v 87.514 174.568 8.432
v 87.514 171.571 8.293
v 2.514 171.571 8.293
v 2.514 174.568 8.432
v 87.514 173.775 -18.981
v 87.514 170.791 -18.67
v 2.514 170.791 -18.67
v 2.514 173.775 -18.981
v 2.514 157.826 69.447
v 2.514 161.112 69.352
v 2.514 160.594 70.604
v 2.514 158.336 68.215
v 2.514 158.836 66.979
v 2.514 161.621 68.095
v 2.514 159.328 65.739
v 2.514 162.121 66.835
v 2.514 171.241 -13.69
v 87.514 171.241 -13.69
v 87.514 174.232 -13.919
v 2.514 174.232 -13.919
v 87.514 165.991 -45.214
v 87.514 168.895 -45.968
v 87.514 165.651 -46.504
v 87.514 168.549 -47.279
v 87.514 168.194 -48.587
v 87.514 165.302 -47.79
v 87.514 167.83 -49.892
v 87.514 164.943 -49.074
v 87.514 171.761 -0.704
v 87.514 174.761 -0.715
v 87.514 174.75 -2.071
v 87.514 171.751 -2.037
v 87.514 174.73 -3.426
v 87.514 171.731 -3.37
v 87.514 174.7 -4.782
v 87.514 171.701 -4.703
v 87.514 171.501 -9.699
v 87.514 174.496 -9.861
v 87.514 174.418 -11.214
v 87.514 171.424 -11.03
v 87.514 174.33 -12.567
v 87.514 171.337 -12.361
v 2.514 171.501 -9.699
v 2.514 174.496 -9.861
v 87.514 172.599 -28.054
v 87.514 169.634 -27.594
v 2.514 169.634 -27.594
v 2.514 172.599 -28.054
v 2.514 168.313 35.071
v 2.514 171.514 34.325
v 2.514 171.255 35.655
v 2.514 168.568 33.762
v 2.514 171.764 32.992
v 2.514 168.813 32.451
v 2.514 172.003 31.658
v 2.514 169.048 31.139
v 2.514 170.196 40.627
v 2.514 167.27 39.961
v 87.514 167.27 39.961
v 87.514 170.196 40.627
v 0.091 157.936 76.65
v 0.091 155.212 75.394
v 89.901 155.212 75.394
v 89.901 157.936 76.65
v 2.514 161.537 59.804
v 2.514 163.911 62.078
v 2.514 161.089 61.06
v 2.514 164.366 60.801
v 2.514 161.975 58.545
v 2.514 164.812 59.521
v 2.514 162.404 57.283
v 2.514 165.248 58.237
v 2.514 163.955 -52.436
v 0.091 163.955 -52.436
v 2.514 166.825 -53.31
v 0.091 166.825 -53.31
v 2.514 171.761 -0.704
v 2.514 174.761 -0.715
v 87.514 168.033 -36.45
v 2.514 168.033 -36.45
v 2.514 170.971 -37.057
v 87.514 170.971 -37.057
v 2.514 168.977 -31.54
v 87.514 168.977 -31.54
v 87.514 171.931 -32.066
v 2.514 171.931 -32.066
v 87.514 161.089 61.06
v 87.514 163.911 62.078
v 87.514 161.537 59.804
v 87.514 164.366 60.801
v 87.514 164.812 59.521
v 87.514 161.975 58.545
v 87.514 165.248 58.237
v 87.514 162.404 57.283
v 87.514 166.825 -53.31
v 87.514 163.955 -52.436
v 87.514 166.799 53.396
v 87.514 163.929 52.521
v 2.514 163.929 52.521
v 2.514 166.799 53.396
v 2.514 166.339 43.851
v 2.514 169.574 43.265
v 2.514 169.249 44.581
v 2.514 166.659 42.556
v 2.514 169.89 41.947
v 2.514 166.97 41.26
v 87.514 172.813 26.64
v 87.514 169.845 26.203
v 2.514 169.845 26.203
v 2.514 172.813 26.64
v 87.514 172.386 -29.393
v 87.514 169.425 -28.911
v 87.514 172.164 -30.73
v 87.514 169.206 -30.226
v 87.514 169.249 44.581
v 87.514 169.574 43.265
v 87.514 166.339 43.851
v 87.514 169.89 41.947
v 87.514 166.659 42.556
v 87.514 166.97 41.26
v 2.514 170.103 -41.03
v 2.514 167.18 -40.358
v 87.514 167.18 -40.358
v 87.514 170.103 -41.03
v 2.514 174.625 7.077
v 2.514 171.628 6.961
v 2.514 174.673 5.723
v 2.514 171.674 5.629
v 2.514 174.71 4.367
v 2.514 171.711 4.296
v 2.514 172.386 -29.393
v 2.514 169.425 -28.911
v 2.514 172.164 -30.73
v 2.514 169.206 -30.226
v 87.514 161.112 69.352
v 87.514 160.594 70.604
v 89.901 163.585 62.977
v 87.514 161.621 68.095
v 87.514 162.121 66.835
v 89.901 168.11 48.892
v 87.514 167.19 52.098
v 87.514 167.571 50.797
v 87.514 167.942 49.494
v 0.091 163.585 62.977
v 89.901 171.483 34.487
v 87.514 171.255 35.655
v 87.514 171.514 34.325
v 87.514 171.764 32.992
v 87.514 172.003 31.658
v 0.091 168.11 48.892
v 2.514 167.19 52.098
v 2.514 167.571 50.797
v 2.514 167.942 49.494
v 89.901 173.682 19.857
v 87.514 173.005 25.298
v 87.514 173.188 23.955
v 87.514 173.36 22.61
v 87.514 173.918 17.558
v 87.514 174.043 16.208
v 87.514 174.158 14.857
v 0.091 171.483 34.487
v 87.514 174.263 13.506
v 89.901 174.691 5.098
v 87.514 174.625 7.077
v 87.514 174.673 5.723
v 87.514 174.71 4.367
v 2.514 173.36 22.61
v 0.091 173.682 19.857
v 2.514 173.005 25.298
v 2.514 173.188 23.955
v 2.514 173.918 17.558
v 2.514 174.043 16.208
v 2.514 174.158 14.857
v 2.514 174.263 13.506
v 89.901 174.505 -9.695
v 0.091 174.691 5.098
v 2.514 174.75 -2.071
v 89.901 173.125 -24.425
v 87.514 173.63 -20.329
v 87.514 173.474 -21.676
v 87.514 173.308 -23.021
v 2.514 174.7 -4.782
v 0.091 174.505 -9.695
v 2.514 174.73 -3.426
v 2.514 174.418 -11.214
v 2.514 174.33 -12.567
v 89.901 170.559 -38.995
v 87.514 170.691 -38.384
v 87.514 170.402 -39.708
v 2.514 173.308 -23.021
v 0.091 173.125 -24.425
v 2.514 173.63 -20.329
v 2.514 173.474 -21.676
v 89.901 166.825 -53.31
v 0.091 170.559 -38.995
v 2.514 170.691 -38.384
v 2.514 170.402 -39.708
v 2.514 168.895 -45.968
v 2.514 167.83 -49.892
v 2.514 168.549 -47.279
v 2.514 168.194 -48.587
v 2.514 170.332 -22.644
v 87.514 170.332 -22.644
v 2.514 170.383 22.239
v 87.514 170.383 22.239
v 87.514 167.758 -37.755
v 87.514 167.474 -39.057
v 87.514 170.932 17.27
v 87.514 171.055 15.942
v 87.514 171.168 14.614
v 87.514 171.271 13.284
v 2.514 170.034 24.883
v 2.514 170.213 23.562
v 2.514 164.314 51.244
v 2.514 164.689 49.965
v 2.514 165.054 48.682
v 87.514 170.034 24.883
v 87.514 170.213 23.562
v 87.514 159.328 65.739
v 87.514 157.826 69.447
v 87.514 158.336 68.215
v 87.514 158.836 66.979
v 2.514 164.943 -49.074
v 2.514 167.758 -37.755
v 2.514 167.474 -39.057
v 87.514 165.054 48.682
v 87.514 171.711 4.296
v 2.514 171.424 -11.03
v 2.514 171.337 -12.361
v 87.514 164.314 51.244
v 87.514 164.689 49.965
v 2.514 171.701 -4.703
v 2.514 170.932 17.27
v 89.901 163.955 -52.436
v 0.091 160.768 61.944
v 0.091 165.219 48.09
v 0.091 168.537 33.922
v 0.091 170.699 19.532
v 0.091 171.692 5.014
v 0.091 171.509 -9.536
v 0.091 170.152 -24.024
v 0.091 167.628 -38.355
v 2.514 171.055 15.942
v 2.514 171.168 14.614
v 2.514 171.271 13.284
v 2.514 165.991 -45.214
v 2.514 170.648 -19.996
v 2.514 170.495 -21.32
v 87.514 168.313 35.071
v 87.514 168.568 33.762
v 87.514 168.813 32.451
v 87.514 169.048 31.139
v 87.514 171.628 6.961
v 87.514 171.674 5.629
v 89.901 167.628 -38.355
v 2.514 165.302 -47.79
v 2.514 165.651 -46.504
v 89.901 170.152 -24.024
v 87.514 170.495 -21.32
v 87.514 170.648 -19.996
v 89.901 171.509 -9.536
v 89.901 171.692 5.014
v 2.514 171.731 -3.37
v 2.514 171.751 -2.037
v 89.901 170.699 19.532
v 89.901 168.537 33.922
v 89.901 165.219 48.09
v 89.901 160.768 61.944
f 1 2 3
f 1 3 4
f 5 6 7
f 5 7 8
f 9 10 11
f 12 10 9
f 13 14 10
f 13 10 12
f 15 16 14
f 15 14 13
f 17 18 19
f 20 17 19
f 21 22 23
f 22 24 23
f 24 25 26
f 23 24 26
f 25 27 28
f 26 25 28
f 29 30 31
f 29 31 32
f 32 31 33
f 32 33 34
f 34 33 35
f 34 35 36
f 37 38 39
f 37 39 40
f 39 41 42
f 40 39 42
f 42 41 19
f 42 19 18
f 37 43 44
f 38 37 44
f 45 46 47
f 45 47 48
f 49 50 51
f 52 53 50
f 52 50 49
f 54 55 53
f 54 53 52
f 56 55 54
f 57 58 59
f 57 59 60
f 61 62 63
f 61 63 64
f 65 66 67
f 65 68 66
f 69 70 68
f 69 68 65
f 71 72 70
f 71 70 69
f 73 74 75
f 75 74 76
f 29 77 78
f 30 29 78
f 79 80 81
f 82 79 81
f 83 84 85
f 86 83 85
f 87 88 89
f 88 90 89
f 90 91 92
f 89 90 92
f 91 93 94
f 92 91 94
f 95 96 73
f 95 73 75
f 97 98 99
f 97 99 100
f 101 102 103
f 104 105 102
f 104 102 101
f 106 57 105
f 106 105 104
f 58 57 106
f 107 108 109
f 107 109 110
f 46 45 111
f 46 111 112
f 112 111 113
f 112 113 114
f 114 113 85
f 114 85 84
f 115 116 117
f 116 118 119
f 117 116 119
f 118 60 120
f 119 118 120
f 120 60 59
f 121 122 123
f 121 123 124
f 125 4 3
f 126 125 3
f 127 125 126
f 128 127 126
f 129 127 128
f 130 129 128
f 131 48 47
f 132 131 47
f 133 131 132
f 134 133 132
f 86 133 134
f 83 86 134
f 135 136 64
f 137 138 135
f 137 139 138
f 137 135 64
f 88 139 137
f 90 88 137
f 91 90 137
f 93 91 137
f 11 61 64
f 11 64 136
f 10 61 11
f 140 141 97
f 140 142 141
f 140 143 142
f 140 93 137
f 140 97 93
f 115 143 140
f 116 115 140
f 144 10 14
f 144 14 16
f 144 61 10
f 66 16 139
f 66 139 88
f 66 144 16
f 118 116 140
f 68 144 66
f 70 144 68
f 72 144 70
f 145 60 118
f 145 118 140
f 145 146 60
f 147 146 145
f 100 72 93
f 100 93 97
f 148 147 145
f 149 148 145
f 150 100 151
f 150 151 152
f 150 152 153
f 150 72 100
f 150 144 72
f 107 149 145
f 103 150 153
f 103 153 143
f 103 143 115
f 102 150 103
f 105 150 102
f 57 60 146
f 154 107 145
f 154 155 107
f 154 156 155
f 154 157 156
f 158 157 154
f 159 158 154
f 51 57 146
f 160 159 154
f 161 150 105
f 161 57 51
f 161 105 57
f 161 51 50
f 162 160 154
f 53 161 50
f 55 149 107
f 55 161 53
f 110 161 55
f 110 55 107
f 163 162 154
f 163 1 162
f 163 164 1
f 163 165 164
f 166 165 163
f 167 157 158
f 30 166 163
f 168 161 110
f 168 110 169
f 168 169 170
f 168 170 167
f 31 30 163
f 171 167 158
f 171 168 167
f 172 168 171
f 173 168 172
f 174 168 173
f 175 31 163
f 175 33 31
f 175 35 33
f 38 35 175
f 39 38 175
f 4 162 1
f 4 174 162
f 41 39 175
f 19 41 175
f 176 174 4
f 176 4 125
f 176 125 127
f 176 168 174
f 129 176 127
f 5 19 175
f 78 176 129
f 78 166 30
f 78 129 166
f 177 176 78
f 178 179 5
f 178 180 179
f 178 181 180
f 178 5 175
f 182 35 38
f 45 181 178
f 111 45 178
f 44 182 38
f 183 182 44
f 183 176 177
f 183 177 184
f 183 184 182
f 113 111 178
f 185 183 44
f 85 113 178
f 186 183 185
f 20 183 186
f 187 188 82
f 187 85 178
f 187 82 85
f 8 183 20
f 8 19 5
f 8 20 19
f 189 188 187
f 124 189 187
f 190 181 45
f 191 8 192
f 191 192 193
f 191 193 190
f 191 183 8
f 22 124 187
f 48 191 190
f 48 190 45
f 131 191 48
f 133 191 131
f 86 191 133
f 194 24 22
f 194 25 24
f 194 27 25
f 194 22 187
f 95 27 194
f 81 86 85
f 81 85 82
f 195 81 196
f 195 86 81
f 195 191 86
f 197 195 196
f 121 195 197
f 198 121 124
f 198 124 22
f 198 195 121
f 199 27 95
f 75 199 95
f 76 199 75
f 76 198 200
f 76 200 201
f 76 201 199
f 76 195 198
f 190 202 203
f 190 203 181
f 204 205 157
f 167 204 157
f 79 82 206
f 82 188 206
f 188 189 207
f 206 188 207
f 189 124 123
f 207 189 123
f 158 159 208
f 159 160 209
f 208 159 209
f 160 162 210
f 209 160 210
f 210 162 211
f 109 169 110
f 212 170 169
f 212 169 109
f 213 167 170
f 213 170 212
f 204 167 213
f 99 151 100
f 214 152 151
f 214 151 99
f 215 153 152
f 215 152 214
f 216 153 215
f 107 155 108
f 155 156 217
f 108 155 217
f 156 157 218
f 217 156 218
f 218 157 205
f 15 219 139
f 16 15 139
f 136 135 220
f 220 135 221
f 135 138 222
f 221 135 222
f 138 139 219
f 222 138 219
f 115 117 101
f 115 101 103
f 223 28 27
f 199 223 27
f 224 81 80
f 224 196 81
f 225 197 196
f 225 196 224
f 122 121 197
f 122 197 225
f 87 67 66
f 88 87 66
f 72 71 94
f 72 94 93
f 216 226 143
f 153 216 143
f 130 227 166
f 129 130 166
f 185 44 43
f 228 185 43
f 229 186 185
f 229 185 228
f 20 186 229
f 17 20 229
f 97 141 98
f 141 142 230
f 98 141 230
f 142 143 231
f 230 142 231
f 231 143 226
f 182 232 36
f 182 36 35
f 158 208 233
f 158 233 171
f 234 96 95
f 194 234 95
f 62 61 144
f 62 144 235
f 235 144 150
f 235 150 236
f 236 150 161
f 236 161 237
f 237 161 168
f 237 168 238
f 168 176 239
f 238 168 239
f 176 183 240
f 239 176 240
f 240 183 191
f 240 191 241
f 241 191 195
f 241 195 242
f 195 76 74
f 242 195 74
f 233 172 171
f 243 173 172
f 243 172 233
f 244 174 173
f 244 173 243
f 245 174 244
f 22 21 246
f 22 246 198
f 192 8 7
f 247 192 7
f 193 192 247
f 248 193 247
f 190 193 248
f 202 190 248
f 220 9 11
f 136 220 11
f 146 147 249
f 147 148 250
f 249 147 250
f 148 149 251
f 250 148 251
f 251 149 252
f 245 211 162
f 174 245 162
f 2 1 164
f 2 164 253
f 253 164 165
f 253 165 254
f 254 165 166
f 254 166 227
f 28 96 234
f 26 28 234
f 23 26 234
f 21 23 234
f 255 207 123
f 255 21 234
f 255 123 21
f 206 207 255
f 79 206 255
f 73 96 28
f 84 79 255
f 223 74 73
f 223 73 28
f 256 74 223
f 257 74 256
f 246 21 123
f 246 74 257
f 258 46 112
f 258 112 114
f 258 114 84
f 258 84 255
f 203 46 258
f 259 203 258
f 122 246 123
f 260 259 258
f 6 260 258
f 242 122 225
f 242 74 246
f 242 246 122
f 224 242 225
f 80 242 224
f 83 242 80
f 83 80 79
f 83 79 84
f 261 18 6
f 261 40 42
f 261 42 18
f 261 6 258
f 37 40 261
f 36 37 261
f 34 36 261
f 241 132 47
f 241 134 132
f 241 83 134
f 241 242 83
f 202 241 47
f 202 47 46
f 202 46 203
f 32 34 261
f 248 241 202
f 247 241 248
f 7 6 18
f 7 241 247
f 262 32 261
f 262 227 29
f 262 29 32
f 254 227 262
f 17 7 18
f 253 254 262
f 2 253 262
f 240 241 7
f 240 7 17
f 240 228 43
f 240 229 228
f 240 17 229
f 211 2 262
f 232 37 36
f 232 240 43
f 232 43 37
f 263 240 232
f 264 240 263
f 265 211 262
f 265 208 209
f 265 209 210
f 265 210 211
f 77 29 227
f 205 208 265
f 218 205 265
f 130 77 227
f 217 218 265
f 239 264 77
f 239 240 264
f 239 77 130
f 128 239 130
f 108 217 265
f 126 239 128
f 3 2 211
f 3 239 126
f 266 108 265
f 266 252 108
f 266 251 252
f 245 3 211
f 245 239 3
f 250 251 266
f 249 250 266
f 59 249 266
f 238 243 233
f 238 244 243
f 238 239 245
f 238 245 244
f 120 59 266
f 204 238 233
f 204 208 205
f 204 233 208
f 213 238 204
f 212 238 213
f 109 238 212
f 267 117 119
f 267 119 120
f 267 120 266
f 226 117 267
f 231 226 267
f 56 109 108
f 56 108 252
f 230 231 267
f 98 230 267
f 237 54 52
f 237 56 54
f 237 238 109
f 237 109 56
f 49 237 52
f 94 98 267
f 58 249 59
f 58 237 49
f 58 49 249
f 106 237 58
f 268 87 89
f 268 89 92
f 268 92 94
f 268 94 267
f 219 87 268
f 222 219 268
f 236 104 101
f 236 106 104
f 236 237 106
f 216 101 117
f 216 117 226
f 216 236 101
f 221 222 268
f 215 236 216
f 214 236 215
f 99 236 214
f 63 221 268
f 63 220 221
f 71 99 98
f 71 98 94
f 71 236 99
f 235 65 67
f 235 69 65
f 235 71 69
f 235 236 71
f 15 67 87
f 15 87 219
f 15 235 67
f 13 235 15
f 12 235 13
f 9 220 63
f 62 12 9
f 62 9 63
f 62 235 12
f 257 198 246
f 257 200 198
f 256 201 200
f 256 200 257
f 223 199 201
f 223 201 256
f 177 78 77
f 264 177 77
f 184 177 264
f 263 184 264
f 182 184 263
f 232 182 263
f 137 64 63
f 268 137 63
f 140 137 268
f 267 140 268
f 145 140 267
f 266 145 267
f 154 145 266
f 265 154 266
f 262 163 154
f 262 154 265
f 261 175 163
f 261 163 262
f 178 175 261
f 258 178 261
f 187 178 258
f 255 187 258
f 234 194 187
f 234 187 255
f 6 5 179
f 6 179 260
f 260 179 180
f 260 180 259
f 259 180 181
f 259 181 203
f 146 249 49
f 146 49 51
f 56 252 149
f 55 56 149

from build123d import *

# Parameters (mm, degrees)
SKETCH2_R                 = 180
SKETCH2_R_2               = 178
EXTRUDE_THIN1_DEPTH       = 90
WRAP1_SECTION_W           = 3
WRAP1_SECTION_H           = 2.3866999
WRAP1_ANGLE               = 41.69859509
WRAP1_SECTOR_2_SECTION_W  = 3
WRAP1_SECTOR_2_SECTION_H  = 85
WRAP1_SECTOR_2_ANGLE      = 2.067873213
WRAP1_SECTOR_3_SECTION_W  = 3
WRAP1_SECTOR_3_SECTION_H  = 85
WRAP1_SECTOR_3_ANGLE      = 1.591549431
WRAP1_SECTOR_4_SECTION_W  = 3
WRAP1_SECTOR_4_SECTION_H  = 85
WRAP1_SECTOR_4_ANGLE      = 1.591549431
WRAP1_SECTOR_5_SECTION_W  = 3
WRAP1_SECTOR_5_SECTION_H  = 85
WRAP1_SECTOR_5_ANGLE      = 1.591549431
WRAP1_SECTOR_6_SECTION_W  = 3
WRAP1_SECTOR_6_SECTION_H  = 85
WRAP1_SECTOR_6_ANGLE      = 1.591549431
WRAP1_SECTOR_7_SECTION_W  = 3
WRAP1_SECTOR_7_SECTION_H  = 85
WRAP1_SECTOR_7_ANGLE      = 1.591549431
WRAP1_SECTOR_8_SECTION_W  = 3
WRAP1_SECTOR_8_SECTION_H  = 85
WRAP1_SECTOR_8_ANGLE      = 1.591549431
WRAP1_SECTOR_9_SECTION_W  = 3
WRAP1_SECTOR_9_SECTION_H  = 85
WRAP1_SECTOR_9_ANGLE      = 1.591549431
WRAP1_SECTOR_10_SECTION_W = 3
WRAP1_SECTOR_10_SECTION_H = 85
WRAP1_SECTOR_10_ANGLE     = 1.591549431
WRAP1_SECTOR_11_SECTION_W = 3
WRAP1_SECTOR_11_SECTION_H = 85
WRAP1_SECTOR_11_ANGLE     = 1.591549431
WRAP1_SECTOR_12_SECTION_W = 3
WRAP1_SECTOR_12_SECTION_H = 85
WRAP1_SECTOR_12_ANGLE     = 1.591549431
WRAP1_SECTOR_13_SECTION_W = 3
WRAP1_SECTOR_13_SECTION_H = 85
WRAP1_SECTOR_13_ANGLE     = 1.591549431
WRAP1_SECTOR_14_SECTION_W = 3
WRAP1_SECTOR_14_SECTION_H = 85
WRAP1_SECTOR_14_ANGLE     = 1.591549431
WRAP1_SECTOR_15_SECTION_W = 3
WRAP1_SECTOR_15_SECTION_H = 85
WRAP1_SECTOR_15_ANGLE     = 1.591549431
WRAP1_SECTOR_16_SECTION_W = 3
WRAP1_SECTOR_16_SECTION_H = 85
WRAP1_SECTOR_16_ANGLE     = 1.115225649
WRAP1_SECTOR_17_SECTION_W = 3
WRAP1_SECTOR_17_SECTION_H = 2.4233001
WRAP1_SECTOR_17_ANGLE     = 41.69859509
SKETCH5_R                 = 180
CUT_EXTRUDE1_DEPTH        = 119


with BuildPart() as part:
    # Sketch2 → Extrude-Thin1 (new body)
    with BuildSketch(Plane(origin=(0, 0, 0), x_dir=(0, 0, -1), z_dir=(1, 0, 0))):
        with Locations((0, -8.237834894)):
            Circle(SKETCH2_R)
        with Locations((0, -8.237834894)):
            Circle(SKETCH2_R_2, mode=Mode.SUBTRACT)
    extrude(amount=EXTRUDE_THIN1_DEPTH)

    # Wrap1 section (on wrap section) → Wrap1 (revolve)
    with BuildSketch(Plane(origin=(0, -8.237834894, 0), x_dir=(0, 0.9080540786996547, 0.41885294574220344), z_dir=(0, -0.41885294574220344, 0.9080540786996547))):
        with Locations((181.5, -88.70726195)):
            Rectangle(WRAP1_SECTION_W, WRAP1_SECTION_H)
    revolve(axis=Axis((0, -8.237834894, 0), (-1, 0, 0)), revolution_arc=WRAP1_ANGLE)

    # Wrap1 sector 2 section (on wrap section) → Wrap1 sector 2 (revolve)
    with BuildSketch(Plane(origin=(0, -8.237834894, 0), x_dir=(0, 0.9080540786996547, 0.41885294574220344), z_dir=(0, -0.41885294574220344, 0.9080540786996547))):
        with Locations((181.5, -45.013912)):
            Rectangle(WRAP1_SECTOR_2_SECTION_W, WRAP1_SECTOR_2_SECTION_H)
    revolve(axis=Axis((0, -8.237834894, 0), (-1, 0, 0)), revolution_arc=WRAP1_SECTOR_2_ANGLE)

    # Wrap1 sector 3 section (on wrap section) → Wrap1 sector 3 (revolve)
    with BuildSketch(Plane(origin=(0, -8.237834894, 0), x_dir=(0, 0.9309215245835882, 0.3652192698461676), z_dir=(0, -0.3652192698461676, 0.9309215245835882))):
        with Locations((181.5, -45.013912)):
            Rectangle(WRAP1_SECTOR_3_SECTION_W, WRAP1_SECTOR_3_SECTION_H)
    revolve(axis=Axis((0, -8.237834894, 0), (-1, 0, 0)), revolution_arc=WRAP1_SECTOR_3_ANGLE)

    # Wrap1 sector 4 section (on wrap section) → Wrap1 sector 4 (revolve)
    with BuildSketch(Plane(origin=(0, -8.237834894, 0), x_dir=(0, 0.9480114707936929, 0.3182361564052382), z_dir=(0, -0.3182361564052382, 0.9480114707936929))):
        with Locations((181.5, -45.013912)):
            Rectangle(WRAP1_SECTOR_4_SECTION_W, WRAP1_SECTOR_4_SECTION_H)
    revolve(axis=Axis((0, -8.237834894, 0), (-1, 0, 0)), revolution_arc=WRAP1_SECTOR_4_ANGLE)

    # Wrap1 sector 5 section (on wrap section) → Wrap1 sector 5 (revolve)
    with BuildSketch(Plane(origin=(0, -8.237834894, 0), x_dir=(0, 0.9627318820416432, 0.2704576183074822), z_dir=(0, -0.2704576183074822, 0.9627318820416432))):
        with Locations((181.5, -45.013912)):
            Rectangle(WRAP1_SECTOR_5_SECTION_W, WRAP1_SECTOR_5_SECTION_H)
    revolve(axis=Axis((0, -8.237834894, 0), (-1, 0, 0)), revolution_arc=WRAP1_SECTOR_5_ANGLE)

    # Wrap1 sector 6 section (on wrap section) → Wrap1 sector 6 (revolve)
    with BuildSketch(Plane(origin=(0, -8.237834894, 0), x_dir=(0, 0.9750459649655612, 0.22200307701556227), z_dir=(0, -0.22200307701556227, 0.9750459649655612))):
        with Locations((181.5, -45.013912)):
            Rectangle(WRAP1_SECTOR_6_SECTION_W, WRAP1_SECTOR_6_SECTION_H)
    revolve(axis=Axis((0, -8.237834894, 0), (-1, 0, 0)), revolution_arc=WRAP1_SECTOR_6_ANGLE)

    # Wrap1 sector 7 section (on wrap section) → Wrap1 sector 7 (revolve)
    with BuildSketch(Plane(origin=(0, -8.237834894, 0), x_dir=(0, 0.9849229407711876, 0.17299364364807088), z_dir=(0, -0.17299364364807088, 0.9849229407711876))):
        with Locations((181.5, -45.013912)):
            Rectangle(WRAP1_SECTOR_7_SECTION_W, WRAP1_SECTOR_7_SECTION_H)
    revolve(axis=Axis((0, -8.237834894, 0), (-1, 0, 0)), revolution_arc=WRAP1_SECTOR_7_ANGLE)

    # Wrap1 sector 8 section (on wrap section) → Wrap1 sector 8 (revolve)
    with BuildSketch(Plane(origin=(0, -8.237834894, 0), x_dir=(0, 0.9923381221628379, 0.1235518162648073), z_dir=(0, -0.1235518162648073, 0.9923381221628379))):
        with Locations((181.5, -45.013912)):
            Rectangle(WRAP1_SECTOR_8_SECTION_W, WRAP1_SECTOR_8_SECTION_H)
    revolve(axis=Axis((0, -8.237834894, 0), (-1, 0, 0)), revolution_arc=WRAP1_SECTOR_8_ANGLE)

    # Wrap1 sector 9 section (on wrap section) → Wrap1 sector 9 (revolve)
    with BuildSketch(Plane(origin=(0, -8.237834894, 0), x_dir=(0, 0.9972729750487846, 0.07380117368542383), z_dir=(0, -0.07380117368542383, 0.9972729750487846))):
        with Locations((181.5, -45.013912)):
            Rectangle(WRAP1_SECTOR_9_SECTION_W, WRAP1_SECTOR_9_SECTION_H)
    revolve(axis=Axis((0, -8.237834894, 0), (-1, 0, 0)), revolution_arc=WRAP1_SECTOR_9_ANGLE)

    # Wrap1 sector 10 section (on wrap section) → Wrap1 sector 10 (revolve)
    with BuildSketch(Plane(origin=(0, -8.237834894, 0), x_dir=(0, 0.9997151648668349, 0.02386606660673497), z_dir=(0, -0.02386606660673497, 0.9997151648668349))):
        with Locations((181.5, -45.013912)):
            Rectangle(WRAP1_SECTOR_10_SECTION_W, WRAP1_SECTOR_10_SECTION_H)
    revolve(axis=Axis((0, -8.237834894, 0), (-1, 0, 0)), revolution_arc=WRAP1_SECTOR_10_ANGLE)

    # Wrap1 sector 11 section (on wrap section) → Wrap1 sector 11 (revolve)
    with BuildSketch(Plane(origin=(0, -8.237834894, 0), x_dir=(0, 0.9996585874143112, -0.02612869320926344), z_dir=(0, 0.02612869320926344, 0.9996585874143112))):
        with Locations((181.5, -45.013912)):
            Rectangle(WRAP1_SECTOR_11_SECTION_W, WRAP1_SECTOR_11_SECTION_H)
    revolve(axis=Axis((0, -8.237834894, 0), (-1, 0, 0)), revolution_arc=WRAP1_SECTOR_11_ANGLE)

    # Wrap1 sector 12 section (on wrap section) → Wrap1 sector 12 (revolve)
    with BuildSketch(Plane(origin=(0, -8.237834894, 0), x_dir=(0, 0.9971033841053801, -0.07605814489979906), z_dir=(0, 0.07605814489979906, 0.9971033841053801))):
        with Locations((181.5, -45.013912)):
            Rectangle(WRAP1_SECTOR_12_SECTION_W, WRAP1_SECTOR_12_SECTION_H)
    revolve(axis=Axis((0, -8.237834894, 0), (-1, 0, 0)), revolution_arc=WRAP1_SECTOR_12_ANGLE)

    # Wrap1 sector 13 section (on wrap section) → Wrap1 sector 13 (revolve)
    with BuildSketch(Plane(origin=(0, -8.237834894, 0), x_dir=(0, 0.9920559416175896, -0.12579749083840142), z_dir=(0, 0.12579749083840142, 0.9920559416175896))):
        with Locations((181.5, -45.013912)):
            Rectangle(WRAP1_SECTOR_13_SECTION_W, WRAP1_SECTOR_13_SECTION_H)
    revolve(axis=Axis((0, -8.237834894, 0), (-1, 0, 0)), revolution_arc=WRAP1_SECTOR_13_ANGLE)

    # Wrap1 sector 14 section (on wrap section) → Wrap1 sector 14 (revolve)
    with BuildSketch(Plane(origin=(0, -8.237834894, 0), x_dir=(0, 0.984528875928502, -0.17522240856397442), z_dir=(0, 0.17522240856397442, 0.984528875928502))):
        with Locations((181.5, -45.013912)):
            Rectangle(WRAP1_SECTOR_14_SECTION_W, WRAP1_SECTOR_14_SECTION_H)
    revolve(axis=Axis((0, -8.237834894, 0), (-1, 0, 0)), revolution_arc=WRAP1_SECTOR_14_ANGLE)

    # Wrap1 sector 15 section (on wrap section) → Wrap1 sector 15 (revolve)
    with BuildSketch(Plane(origin=(0, -8.237834894, 0), x_dir=(0, 0.97454100078232, -0.22420936152220386), z_dir=(0, 0.22420936152220386, 0.97454100078232))):
        with Locations((181.5, -45.013912)):
            Rectangle(WRAP1_SECTOR_15_SECTION_W, WRAP1_SECTOR_15_SECTION_H)
    revolve(axis=Axis((0, -8.237834894, 0), (-1, 0, 0)), revolution_arc=WRAP1_SECTOR_15_ANGLE)

    # Wrap1 sector 16 section (on wrap section) → Wrap1 sector 16 (revolve)
    with BuildSketch(Plane(origin=(0, -8.237834894, 0), x_dir=(0, 0.9621172806653241, -0.27263590784260605), z_dir=(0, 0.27263590784260605, 0.9621172806653241))):
        with Locations((181.5, -45.013912)):
            Rectangle(WRAP1_SECTOR_16_SECTION_W, WRAP1_SECTOR_16_SECTION_H)
    revolve(axis=Axis((0, -8.237834894, 0), (-1, 0, 0)), revolution_arc=WRAP1_SECTOR_16_ANGLE)

    # Wrap1 sector 17 section (on wrap section) → Wrap1 sector 17 (revolve)
    with BuildSketch(Plane(origin=(0, -8.237834894, 0), x_dir=(0, 0.9080540786996547, 0.41885294574220344), z_dir=(0, -0.41885294574220344, 0.9080540786996547))):
        with Locations((181.5, -1.30226195)):
            Rectangle(WRAP1_SECTOR_17_SECTION_W, WRAP1_SECTOR_17_SECTION_H)
    revolve(axis=Axis((0, -8.237834894, 0), (-1, 0, 0)), revolution_arc=WRAP1_SECTOR_17_ANGLE)

    # Sketch5 → Cut-Extrude1 (cut)
    with BuildSketch(Plane(origin=(0, 0, 0), x_dir=(0, 0, -1), z_dir=(1, 0, 0))):
        with Locations((0, -8.237834894)):
            Circle(SKETCH5_R)
    extrude(amount=CUT_EXTRUDE1_DEPTH, mode=Mode.SUBTRACT)


solid = part.part
